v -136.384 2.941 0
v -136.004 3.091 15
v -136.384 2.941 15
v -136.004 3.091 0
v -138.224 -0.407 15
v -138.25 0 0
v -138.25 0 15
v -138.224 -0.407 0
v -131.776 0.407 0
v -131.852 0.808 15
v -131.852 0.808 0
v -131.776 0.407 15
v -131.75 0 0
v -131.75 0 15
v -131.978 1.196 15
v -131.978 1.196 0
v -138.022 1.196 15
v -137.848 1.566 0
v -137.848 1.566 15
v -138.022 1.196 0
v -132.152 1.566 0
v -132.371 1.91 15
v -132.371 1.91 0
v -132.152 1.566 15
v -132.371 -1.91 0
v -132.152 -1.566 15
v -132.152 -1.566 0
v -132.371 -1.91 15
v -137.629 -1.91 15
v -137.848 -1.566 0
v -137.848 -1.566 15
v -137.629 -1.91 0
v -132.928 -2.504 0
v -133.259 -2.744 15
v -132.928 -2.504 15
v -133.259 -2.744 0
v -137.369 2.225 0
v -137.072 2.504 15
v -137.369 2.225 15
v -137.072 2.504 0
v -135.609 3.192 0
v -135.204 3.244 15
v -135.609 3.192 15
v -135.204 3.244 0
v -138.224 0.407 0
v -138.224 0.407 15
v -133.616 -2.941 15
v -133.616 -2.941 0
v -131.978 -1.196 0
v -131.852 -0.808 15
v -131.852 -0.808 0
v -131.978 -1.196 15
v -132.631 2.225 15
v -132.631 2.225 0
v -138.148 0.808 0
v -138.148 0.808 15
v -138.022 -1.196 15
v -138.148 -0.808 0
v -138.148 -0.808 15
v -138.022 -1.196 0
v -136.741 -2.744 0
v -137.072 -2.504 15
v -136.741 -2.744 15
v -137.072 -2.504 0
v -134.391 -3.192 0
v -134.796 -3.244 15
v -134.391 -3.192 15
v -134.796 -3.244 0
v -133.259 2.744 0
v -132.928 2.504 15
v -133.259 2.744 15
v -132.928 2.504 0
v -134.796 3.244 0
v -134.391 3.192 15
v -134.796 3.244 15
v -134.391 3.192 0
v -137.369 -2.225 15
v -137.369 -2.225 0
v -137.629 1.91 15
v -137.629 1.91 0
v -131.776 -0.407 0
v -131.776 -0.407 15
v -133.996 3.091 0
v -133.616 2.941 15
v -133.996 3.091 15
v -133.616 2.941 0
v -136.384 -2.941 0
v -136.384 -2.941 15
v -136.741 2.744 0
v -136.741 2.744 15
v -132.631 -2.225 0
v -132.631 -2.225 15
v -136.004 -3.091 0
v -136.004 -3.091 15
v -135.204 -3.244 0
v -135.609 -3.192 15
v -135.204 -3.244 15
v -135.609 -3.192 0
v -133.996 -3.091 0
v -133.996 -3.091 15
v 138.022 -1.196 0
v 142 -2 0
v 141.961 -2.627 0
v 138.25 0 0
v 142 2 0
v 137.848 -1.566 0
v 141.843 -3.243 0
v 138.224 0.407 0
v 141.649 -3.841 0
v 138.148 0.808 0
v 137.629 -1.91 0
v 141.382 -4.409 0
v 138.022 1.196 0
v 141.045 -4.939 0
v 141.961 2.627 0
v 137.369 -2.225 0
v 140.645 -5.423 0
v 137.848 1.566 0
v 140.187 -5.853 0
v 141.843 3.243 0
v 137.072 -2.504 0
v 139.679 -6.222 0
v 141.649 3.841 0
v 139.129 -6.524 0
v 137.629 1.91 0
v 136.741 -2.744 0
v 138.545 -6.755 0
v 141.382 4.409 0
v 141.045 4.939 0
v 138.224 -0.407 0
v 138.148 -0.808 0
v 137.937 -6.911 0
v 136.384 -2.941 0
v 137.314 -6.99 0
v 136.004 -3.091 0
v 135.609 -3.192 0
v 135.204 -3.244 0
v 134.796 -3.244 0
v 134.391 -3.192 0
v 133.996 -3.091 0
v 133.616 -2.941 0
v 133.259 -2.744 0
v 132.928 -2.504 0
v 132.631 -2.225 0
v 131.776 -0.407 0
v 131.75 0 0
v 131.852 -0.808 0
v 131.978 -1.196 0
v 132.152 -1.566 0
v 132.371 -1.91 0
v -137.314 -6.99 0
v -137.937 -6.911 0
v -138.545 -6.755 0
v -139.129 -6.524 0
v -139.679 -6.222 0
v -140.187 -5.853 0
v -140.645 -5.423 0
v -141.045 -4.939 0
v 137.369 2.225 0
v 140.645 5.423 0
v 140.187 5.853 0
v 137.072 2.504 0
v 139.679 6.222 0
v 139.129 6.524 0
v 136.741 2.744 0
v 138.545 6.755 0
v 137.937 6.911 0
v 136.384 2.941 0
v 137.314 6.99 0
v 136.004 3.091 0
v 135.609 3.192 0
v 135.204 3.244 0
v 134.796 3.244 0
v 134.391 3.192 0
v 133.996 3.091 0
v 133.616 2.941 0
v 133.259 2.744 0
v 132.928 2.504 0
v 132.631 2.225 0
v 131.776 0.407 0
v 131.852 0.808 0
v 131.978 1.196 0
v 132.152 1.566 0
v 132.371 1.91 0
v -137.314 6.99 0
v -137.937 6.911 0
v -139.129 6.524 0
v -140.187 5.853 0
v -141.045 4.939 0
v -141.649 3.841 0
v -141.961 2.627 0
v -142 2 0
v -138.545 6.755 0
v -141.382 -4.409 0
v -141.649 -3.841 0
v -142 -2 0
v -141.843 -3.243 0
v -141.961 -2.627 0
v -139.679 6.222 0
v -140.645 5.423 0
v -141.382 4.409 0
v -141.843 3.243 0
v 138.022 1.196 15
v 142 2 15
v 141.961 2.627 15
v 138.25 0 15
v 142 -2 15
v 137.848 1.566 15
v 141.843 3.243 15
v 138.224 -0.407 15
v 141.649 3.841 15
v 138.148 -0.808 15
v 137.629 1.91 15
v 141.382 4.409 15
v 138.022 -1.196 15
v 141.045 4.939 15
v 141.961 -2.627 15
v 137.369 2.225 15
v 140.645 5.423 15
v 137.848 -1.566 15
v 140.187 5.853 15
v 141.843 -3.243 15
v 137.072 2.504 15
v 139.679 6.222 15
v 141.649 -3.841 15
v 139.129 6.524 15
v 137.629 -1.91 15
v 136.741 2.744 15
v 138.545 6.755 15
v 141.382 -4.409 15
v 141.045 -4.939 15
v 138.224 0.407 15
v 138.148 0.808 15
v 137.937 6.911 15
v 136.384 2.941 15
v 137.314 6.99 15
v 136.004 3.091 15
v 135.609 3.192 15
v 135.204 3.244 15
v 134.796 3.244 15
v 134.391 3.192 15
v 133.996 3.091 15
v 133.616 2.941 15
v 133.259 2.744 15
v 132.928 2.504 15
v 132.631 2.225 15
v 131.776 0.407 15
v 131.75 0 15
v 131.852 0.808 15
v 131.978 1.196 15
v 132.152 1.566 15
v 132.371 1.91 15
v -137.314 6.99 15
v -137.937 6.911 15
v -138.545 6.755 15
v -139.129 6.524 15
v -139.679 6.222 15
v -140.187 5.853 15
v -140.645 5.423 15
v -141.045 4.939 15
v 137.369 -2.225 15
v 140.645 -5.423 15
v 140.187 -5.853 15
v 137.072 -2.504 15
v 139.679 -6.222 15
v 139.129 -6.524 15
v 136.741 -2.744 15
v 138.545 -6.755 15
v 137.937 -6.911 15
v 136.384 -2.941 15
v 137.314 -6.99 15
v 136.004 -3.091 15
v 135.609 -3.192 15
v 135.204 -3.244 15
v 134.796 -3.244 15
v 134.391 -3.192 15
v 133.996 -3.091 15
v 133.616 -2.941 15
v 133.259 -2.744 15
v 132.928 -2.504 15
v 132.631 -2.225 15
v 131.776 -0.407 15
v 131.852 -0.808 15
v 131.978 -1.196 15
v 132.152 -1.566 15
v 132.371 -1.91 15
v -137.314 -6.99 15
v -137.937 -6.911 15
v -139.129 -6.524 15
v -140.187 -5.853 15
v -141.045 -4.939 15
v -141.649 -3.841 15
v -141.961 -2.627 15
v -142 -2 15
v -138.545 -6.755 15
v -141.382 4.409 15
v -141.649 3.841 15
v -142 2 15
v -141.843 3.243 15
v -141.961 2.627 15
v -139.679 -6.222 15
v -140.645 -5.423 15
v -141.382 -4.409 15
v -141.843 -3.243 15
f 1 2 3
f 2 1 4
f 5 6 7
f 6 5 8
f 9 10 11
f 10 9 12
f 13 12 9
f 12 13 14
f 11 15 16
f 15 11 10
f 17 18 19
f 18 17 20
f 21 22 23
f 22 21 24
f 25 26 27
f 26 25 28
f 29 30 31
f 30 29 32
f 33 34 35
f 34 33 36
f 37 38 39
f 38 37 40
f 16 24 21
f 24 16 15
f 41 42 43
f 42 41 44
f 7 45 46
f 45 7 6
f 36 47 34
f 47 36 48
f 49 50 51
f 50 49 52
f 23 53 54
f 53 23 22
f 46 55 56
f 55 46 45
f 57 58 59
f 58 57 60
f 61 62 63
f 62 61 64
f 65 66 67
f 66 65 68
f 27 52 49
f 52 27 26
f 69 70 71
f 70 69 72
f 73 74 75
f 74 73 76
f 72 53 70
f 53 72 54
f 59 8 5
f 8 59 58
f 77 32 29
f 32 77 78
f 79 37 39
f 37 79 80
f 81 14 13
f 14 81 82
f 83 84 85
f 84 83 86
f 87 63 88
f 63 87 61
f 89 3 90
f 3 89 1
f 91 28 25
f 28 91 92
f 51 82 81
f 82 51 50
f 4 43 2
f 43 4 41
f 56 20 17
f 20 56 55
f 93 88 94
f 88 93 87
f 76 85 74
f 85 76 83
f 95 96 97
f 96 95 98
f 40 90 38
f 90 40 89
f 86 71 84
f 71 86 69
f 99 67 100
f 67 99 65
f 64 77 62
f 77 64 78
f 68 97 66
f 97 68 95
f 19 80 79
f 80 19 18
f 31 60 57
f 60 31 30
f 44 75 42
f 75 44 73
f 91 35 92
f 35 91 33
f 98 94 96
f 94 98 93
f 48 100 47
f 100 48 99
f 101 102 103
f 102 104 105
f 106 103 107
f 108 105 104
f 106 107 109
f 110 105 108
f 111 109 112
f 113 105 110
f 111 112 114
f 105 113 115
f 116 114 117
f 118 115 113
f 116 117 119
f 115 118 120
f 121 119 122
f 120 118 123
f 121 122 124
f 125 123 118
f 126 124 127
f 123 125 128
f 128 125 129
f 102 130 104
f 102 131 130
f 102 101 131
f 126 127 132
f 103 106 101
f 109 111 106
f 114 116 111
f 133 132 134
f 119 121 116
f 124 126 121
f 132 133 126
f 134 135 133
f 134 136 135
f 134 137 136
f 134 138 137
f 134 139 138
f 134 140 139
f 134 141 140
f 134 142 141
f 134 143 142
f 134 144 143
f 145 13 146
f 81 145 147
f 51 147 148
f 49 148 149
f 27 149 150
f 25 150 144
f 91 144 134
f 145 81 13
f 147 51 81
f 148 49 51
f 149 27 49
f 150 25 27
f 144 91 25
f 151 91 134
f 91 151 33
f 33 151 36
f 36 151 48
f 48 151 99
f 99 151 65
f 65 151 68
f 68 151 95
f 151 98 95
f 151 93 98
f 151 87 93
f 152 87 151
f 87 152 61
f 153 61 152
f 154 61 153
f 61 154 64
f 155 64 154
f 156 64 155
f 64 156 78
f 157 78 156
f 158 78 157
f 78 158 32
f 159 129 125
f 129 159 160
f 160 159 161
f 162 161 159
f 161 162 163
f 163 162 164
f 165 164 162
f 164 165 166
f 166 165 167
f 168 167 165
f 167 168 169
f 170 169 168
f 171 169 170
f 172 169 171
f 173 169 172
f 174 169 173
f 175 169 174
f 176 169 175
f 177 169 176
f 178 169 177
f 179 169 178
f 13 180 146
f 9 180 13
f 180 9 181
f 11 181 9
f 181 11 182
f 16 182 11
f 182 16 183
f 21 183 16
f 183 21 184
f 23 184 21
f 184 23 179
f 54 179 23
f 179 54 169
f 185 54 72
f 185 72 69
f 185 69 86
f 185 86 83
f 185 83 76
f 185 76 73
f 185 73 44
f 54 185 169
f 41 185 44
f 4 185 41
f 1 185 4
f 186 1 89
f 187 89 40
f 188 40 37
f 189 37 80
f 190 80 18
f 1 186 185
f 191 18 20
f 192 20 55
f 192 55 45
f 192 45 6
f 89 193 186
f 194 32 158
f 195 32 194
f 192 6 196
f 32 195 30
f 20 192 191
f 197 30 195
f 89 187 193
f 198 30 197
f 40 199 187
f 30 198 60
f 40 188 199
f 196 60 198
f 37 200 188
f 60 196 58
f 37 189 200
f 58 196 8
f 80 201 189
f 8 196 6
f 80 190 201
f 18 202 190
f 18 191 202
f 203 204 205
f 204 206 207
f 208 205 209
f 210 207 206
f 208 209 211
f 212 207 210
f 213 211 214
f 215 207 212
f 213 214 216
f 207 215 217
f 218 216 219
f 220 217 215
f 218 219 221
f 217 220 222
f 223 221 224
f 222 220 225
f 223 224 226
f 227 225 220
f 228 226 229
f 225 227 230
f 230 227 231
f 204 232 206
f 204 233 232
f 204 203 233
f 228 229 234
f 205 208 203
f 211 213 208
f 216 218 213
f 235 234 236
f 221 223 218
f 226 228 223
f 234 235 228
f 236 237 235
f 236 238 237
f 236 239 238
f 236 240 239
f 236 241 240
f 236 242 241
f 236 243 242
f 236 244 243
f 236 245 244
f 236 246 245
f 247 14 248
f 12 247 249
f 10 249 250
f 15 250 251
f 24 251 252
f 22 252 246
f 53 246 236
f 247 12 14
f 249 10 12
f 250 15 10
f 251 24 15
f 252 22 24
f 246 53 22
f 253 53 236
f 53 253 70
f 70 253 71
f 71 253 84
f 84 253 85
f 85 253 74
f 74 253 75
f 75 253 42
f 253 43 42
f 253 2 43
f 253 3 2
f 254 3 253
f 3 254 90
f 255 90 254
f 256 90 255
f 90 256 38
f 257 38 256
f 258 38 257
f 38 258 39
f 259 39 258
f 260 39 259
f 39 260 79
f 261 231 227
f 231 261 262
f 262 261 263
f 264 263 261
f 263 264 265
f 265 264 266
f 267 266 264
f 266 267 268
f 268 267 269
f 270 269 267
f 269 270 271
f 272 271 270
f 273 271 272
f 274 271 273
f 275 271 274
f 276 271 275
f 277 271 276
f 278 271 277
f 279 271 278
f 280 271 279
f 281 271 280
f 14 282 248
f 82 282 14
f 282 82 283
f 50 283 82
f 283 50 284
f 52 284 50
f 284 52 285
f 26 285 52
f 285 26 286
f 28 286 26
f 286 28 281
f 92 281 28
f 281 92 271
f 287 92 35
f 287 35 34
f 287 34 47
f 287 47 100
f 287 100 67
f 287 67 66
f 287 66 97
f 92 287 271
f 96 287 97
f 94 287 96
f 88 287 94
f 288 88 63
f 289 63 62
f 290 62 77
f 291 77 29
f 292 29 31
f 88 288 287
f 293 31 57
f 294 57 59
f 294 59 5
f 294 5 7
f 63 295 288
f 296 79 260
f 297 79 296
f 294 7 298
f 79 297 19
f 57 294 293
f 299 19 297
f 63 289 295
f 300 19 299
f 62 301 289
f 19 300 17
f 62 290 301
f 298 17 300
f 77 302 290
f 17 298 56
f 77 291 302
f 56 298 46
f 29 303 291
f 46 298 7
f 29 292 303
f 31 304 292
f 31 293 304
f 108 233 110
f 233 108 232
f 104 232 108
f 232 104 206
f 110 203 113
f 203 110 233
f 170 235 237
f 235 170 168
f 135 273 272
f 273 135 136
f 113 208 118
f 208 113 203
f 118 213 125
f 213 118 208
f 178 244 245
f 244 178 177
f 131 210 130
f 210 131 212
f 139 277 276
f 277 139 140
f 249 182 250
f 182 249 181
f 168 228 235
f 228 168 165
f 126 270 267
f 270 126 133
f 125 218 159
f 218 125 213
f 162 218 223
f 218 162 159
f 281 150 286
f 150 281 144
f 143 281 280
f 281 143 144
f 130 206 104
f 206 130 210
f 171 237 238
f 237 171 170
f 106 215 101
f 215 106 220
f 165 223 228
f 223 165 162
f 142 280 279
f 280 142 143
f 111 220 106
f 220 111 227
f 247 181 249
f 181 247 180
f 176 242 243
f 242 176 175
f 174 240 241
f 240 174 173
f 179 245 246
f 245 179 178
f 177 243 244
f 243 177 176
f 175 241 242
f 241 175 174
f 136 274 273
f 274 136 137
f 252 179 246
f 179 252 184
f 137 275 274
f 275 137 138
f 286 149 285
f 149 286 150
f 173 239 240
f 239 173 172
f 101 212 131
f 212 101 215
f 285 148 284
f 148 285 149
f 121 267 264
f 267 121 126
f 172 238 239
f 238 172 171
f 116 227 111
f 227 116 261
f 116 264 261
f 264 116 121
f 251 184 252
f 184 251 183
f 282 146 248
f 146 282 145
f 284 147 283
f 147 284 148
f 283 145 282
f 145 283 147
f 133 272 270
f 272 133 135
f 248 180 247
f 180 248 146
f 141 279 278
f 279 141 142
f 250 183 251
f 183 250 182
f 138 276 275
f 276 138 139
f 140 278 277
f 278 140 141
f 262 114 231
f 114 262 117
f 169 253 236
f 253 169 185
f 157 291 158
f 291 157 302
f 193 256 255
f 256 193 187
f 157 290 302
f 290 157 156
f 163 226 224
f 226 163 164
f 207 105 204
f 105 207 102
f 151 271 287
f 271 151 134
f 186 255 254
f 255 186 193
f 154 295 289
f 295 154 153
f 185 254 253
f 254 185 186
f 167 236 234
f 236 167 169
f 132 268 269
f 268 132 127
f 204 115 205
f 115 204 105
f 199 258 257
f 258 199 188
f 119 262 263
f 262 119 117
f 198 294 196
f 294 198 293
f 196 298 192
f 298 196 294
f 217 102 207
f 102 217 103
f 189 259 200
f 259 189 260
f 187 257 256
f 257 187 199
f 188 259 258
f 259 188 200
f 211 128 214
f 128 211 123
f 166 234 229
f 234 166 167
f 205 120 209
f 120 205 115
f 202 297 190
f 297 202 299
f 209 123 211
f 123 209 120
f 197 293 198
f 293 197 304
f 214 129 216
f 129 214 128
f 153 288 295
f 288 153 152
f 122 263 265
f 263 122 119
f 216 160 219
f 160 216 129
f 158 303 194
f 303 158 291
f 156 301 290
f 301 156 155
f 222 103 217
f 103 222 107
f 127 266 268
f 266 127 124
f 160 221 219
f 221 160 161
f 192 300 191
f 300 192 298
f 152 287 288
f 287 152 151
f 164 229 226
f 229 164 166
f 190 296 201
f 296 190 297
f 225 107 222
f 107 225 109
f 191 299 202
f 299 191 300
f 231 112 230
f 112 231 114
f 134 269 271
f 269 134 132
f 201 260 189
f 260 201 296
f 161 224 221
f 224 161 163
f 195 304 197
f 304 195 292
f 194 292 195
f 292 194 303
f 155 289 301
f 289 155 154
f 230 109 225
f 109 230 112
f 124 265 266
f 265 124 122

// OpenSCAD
$fn = 50;


difference() {
	union() {
		hull() {
			translate(v = [-137.0000000000, 2.0000000000, 0]) {
				cylinder(h = 15, r = 5);
			}
			translate(v = [137.0000000000, 2.0000000000, 0]) {
				cylinder(h = 15, r = 5);
			}
			translate(v = [-137.0000000000, -2.0000000000, 0]) {
				cylinder(h = 15, r = 5);
			}
			translate(v = [137.0000000000, -2.0000000000, 0]) {
				cylinder(h = 15, r = 5);
			}
		}
	}
	union() {
		translate(v = [-135.0000000000, 0.0000000000, 0]) {
			cylinder(h = 15, r = 3.2500000000);
		}
		translate(v = [135.0000000000, 0.0000000000, 0]) {
			cylinder(h = 15, r = 3.2500000000);
		}
		translate(v = [-135.0000000000, 0.0000000000, 0]) {
			cylinder(h = 15, r = 1.8000000000);
		}
		translate(v = [135.0000000000, 0.0000000000, 0]) {
			cylinder(h = 15, r = 1.8000000000);
		}
		translate(v = [-135.0000000000, 0.0000000000, 0]) {
			cylinder(h = 15, r = 1.8000000000);
		}
		translate(v = [135.0000000000, 0.0000000000, 0]) {
			cylinder(h = 15, r = 1.8000000000);
		}
		translate(v = [-135.0000000000, 0.0000000000, 0]) {
			cylinder(h = 15, r = 1.8000000000);
		}
		translate(v = [135.0000000000, 0.0000000000, 0]) {
			cylinder(h = 15, r = 1.8000000000);
		}
	}
}
